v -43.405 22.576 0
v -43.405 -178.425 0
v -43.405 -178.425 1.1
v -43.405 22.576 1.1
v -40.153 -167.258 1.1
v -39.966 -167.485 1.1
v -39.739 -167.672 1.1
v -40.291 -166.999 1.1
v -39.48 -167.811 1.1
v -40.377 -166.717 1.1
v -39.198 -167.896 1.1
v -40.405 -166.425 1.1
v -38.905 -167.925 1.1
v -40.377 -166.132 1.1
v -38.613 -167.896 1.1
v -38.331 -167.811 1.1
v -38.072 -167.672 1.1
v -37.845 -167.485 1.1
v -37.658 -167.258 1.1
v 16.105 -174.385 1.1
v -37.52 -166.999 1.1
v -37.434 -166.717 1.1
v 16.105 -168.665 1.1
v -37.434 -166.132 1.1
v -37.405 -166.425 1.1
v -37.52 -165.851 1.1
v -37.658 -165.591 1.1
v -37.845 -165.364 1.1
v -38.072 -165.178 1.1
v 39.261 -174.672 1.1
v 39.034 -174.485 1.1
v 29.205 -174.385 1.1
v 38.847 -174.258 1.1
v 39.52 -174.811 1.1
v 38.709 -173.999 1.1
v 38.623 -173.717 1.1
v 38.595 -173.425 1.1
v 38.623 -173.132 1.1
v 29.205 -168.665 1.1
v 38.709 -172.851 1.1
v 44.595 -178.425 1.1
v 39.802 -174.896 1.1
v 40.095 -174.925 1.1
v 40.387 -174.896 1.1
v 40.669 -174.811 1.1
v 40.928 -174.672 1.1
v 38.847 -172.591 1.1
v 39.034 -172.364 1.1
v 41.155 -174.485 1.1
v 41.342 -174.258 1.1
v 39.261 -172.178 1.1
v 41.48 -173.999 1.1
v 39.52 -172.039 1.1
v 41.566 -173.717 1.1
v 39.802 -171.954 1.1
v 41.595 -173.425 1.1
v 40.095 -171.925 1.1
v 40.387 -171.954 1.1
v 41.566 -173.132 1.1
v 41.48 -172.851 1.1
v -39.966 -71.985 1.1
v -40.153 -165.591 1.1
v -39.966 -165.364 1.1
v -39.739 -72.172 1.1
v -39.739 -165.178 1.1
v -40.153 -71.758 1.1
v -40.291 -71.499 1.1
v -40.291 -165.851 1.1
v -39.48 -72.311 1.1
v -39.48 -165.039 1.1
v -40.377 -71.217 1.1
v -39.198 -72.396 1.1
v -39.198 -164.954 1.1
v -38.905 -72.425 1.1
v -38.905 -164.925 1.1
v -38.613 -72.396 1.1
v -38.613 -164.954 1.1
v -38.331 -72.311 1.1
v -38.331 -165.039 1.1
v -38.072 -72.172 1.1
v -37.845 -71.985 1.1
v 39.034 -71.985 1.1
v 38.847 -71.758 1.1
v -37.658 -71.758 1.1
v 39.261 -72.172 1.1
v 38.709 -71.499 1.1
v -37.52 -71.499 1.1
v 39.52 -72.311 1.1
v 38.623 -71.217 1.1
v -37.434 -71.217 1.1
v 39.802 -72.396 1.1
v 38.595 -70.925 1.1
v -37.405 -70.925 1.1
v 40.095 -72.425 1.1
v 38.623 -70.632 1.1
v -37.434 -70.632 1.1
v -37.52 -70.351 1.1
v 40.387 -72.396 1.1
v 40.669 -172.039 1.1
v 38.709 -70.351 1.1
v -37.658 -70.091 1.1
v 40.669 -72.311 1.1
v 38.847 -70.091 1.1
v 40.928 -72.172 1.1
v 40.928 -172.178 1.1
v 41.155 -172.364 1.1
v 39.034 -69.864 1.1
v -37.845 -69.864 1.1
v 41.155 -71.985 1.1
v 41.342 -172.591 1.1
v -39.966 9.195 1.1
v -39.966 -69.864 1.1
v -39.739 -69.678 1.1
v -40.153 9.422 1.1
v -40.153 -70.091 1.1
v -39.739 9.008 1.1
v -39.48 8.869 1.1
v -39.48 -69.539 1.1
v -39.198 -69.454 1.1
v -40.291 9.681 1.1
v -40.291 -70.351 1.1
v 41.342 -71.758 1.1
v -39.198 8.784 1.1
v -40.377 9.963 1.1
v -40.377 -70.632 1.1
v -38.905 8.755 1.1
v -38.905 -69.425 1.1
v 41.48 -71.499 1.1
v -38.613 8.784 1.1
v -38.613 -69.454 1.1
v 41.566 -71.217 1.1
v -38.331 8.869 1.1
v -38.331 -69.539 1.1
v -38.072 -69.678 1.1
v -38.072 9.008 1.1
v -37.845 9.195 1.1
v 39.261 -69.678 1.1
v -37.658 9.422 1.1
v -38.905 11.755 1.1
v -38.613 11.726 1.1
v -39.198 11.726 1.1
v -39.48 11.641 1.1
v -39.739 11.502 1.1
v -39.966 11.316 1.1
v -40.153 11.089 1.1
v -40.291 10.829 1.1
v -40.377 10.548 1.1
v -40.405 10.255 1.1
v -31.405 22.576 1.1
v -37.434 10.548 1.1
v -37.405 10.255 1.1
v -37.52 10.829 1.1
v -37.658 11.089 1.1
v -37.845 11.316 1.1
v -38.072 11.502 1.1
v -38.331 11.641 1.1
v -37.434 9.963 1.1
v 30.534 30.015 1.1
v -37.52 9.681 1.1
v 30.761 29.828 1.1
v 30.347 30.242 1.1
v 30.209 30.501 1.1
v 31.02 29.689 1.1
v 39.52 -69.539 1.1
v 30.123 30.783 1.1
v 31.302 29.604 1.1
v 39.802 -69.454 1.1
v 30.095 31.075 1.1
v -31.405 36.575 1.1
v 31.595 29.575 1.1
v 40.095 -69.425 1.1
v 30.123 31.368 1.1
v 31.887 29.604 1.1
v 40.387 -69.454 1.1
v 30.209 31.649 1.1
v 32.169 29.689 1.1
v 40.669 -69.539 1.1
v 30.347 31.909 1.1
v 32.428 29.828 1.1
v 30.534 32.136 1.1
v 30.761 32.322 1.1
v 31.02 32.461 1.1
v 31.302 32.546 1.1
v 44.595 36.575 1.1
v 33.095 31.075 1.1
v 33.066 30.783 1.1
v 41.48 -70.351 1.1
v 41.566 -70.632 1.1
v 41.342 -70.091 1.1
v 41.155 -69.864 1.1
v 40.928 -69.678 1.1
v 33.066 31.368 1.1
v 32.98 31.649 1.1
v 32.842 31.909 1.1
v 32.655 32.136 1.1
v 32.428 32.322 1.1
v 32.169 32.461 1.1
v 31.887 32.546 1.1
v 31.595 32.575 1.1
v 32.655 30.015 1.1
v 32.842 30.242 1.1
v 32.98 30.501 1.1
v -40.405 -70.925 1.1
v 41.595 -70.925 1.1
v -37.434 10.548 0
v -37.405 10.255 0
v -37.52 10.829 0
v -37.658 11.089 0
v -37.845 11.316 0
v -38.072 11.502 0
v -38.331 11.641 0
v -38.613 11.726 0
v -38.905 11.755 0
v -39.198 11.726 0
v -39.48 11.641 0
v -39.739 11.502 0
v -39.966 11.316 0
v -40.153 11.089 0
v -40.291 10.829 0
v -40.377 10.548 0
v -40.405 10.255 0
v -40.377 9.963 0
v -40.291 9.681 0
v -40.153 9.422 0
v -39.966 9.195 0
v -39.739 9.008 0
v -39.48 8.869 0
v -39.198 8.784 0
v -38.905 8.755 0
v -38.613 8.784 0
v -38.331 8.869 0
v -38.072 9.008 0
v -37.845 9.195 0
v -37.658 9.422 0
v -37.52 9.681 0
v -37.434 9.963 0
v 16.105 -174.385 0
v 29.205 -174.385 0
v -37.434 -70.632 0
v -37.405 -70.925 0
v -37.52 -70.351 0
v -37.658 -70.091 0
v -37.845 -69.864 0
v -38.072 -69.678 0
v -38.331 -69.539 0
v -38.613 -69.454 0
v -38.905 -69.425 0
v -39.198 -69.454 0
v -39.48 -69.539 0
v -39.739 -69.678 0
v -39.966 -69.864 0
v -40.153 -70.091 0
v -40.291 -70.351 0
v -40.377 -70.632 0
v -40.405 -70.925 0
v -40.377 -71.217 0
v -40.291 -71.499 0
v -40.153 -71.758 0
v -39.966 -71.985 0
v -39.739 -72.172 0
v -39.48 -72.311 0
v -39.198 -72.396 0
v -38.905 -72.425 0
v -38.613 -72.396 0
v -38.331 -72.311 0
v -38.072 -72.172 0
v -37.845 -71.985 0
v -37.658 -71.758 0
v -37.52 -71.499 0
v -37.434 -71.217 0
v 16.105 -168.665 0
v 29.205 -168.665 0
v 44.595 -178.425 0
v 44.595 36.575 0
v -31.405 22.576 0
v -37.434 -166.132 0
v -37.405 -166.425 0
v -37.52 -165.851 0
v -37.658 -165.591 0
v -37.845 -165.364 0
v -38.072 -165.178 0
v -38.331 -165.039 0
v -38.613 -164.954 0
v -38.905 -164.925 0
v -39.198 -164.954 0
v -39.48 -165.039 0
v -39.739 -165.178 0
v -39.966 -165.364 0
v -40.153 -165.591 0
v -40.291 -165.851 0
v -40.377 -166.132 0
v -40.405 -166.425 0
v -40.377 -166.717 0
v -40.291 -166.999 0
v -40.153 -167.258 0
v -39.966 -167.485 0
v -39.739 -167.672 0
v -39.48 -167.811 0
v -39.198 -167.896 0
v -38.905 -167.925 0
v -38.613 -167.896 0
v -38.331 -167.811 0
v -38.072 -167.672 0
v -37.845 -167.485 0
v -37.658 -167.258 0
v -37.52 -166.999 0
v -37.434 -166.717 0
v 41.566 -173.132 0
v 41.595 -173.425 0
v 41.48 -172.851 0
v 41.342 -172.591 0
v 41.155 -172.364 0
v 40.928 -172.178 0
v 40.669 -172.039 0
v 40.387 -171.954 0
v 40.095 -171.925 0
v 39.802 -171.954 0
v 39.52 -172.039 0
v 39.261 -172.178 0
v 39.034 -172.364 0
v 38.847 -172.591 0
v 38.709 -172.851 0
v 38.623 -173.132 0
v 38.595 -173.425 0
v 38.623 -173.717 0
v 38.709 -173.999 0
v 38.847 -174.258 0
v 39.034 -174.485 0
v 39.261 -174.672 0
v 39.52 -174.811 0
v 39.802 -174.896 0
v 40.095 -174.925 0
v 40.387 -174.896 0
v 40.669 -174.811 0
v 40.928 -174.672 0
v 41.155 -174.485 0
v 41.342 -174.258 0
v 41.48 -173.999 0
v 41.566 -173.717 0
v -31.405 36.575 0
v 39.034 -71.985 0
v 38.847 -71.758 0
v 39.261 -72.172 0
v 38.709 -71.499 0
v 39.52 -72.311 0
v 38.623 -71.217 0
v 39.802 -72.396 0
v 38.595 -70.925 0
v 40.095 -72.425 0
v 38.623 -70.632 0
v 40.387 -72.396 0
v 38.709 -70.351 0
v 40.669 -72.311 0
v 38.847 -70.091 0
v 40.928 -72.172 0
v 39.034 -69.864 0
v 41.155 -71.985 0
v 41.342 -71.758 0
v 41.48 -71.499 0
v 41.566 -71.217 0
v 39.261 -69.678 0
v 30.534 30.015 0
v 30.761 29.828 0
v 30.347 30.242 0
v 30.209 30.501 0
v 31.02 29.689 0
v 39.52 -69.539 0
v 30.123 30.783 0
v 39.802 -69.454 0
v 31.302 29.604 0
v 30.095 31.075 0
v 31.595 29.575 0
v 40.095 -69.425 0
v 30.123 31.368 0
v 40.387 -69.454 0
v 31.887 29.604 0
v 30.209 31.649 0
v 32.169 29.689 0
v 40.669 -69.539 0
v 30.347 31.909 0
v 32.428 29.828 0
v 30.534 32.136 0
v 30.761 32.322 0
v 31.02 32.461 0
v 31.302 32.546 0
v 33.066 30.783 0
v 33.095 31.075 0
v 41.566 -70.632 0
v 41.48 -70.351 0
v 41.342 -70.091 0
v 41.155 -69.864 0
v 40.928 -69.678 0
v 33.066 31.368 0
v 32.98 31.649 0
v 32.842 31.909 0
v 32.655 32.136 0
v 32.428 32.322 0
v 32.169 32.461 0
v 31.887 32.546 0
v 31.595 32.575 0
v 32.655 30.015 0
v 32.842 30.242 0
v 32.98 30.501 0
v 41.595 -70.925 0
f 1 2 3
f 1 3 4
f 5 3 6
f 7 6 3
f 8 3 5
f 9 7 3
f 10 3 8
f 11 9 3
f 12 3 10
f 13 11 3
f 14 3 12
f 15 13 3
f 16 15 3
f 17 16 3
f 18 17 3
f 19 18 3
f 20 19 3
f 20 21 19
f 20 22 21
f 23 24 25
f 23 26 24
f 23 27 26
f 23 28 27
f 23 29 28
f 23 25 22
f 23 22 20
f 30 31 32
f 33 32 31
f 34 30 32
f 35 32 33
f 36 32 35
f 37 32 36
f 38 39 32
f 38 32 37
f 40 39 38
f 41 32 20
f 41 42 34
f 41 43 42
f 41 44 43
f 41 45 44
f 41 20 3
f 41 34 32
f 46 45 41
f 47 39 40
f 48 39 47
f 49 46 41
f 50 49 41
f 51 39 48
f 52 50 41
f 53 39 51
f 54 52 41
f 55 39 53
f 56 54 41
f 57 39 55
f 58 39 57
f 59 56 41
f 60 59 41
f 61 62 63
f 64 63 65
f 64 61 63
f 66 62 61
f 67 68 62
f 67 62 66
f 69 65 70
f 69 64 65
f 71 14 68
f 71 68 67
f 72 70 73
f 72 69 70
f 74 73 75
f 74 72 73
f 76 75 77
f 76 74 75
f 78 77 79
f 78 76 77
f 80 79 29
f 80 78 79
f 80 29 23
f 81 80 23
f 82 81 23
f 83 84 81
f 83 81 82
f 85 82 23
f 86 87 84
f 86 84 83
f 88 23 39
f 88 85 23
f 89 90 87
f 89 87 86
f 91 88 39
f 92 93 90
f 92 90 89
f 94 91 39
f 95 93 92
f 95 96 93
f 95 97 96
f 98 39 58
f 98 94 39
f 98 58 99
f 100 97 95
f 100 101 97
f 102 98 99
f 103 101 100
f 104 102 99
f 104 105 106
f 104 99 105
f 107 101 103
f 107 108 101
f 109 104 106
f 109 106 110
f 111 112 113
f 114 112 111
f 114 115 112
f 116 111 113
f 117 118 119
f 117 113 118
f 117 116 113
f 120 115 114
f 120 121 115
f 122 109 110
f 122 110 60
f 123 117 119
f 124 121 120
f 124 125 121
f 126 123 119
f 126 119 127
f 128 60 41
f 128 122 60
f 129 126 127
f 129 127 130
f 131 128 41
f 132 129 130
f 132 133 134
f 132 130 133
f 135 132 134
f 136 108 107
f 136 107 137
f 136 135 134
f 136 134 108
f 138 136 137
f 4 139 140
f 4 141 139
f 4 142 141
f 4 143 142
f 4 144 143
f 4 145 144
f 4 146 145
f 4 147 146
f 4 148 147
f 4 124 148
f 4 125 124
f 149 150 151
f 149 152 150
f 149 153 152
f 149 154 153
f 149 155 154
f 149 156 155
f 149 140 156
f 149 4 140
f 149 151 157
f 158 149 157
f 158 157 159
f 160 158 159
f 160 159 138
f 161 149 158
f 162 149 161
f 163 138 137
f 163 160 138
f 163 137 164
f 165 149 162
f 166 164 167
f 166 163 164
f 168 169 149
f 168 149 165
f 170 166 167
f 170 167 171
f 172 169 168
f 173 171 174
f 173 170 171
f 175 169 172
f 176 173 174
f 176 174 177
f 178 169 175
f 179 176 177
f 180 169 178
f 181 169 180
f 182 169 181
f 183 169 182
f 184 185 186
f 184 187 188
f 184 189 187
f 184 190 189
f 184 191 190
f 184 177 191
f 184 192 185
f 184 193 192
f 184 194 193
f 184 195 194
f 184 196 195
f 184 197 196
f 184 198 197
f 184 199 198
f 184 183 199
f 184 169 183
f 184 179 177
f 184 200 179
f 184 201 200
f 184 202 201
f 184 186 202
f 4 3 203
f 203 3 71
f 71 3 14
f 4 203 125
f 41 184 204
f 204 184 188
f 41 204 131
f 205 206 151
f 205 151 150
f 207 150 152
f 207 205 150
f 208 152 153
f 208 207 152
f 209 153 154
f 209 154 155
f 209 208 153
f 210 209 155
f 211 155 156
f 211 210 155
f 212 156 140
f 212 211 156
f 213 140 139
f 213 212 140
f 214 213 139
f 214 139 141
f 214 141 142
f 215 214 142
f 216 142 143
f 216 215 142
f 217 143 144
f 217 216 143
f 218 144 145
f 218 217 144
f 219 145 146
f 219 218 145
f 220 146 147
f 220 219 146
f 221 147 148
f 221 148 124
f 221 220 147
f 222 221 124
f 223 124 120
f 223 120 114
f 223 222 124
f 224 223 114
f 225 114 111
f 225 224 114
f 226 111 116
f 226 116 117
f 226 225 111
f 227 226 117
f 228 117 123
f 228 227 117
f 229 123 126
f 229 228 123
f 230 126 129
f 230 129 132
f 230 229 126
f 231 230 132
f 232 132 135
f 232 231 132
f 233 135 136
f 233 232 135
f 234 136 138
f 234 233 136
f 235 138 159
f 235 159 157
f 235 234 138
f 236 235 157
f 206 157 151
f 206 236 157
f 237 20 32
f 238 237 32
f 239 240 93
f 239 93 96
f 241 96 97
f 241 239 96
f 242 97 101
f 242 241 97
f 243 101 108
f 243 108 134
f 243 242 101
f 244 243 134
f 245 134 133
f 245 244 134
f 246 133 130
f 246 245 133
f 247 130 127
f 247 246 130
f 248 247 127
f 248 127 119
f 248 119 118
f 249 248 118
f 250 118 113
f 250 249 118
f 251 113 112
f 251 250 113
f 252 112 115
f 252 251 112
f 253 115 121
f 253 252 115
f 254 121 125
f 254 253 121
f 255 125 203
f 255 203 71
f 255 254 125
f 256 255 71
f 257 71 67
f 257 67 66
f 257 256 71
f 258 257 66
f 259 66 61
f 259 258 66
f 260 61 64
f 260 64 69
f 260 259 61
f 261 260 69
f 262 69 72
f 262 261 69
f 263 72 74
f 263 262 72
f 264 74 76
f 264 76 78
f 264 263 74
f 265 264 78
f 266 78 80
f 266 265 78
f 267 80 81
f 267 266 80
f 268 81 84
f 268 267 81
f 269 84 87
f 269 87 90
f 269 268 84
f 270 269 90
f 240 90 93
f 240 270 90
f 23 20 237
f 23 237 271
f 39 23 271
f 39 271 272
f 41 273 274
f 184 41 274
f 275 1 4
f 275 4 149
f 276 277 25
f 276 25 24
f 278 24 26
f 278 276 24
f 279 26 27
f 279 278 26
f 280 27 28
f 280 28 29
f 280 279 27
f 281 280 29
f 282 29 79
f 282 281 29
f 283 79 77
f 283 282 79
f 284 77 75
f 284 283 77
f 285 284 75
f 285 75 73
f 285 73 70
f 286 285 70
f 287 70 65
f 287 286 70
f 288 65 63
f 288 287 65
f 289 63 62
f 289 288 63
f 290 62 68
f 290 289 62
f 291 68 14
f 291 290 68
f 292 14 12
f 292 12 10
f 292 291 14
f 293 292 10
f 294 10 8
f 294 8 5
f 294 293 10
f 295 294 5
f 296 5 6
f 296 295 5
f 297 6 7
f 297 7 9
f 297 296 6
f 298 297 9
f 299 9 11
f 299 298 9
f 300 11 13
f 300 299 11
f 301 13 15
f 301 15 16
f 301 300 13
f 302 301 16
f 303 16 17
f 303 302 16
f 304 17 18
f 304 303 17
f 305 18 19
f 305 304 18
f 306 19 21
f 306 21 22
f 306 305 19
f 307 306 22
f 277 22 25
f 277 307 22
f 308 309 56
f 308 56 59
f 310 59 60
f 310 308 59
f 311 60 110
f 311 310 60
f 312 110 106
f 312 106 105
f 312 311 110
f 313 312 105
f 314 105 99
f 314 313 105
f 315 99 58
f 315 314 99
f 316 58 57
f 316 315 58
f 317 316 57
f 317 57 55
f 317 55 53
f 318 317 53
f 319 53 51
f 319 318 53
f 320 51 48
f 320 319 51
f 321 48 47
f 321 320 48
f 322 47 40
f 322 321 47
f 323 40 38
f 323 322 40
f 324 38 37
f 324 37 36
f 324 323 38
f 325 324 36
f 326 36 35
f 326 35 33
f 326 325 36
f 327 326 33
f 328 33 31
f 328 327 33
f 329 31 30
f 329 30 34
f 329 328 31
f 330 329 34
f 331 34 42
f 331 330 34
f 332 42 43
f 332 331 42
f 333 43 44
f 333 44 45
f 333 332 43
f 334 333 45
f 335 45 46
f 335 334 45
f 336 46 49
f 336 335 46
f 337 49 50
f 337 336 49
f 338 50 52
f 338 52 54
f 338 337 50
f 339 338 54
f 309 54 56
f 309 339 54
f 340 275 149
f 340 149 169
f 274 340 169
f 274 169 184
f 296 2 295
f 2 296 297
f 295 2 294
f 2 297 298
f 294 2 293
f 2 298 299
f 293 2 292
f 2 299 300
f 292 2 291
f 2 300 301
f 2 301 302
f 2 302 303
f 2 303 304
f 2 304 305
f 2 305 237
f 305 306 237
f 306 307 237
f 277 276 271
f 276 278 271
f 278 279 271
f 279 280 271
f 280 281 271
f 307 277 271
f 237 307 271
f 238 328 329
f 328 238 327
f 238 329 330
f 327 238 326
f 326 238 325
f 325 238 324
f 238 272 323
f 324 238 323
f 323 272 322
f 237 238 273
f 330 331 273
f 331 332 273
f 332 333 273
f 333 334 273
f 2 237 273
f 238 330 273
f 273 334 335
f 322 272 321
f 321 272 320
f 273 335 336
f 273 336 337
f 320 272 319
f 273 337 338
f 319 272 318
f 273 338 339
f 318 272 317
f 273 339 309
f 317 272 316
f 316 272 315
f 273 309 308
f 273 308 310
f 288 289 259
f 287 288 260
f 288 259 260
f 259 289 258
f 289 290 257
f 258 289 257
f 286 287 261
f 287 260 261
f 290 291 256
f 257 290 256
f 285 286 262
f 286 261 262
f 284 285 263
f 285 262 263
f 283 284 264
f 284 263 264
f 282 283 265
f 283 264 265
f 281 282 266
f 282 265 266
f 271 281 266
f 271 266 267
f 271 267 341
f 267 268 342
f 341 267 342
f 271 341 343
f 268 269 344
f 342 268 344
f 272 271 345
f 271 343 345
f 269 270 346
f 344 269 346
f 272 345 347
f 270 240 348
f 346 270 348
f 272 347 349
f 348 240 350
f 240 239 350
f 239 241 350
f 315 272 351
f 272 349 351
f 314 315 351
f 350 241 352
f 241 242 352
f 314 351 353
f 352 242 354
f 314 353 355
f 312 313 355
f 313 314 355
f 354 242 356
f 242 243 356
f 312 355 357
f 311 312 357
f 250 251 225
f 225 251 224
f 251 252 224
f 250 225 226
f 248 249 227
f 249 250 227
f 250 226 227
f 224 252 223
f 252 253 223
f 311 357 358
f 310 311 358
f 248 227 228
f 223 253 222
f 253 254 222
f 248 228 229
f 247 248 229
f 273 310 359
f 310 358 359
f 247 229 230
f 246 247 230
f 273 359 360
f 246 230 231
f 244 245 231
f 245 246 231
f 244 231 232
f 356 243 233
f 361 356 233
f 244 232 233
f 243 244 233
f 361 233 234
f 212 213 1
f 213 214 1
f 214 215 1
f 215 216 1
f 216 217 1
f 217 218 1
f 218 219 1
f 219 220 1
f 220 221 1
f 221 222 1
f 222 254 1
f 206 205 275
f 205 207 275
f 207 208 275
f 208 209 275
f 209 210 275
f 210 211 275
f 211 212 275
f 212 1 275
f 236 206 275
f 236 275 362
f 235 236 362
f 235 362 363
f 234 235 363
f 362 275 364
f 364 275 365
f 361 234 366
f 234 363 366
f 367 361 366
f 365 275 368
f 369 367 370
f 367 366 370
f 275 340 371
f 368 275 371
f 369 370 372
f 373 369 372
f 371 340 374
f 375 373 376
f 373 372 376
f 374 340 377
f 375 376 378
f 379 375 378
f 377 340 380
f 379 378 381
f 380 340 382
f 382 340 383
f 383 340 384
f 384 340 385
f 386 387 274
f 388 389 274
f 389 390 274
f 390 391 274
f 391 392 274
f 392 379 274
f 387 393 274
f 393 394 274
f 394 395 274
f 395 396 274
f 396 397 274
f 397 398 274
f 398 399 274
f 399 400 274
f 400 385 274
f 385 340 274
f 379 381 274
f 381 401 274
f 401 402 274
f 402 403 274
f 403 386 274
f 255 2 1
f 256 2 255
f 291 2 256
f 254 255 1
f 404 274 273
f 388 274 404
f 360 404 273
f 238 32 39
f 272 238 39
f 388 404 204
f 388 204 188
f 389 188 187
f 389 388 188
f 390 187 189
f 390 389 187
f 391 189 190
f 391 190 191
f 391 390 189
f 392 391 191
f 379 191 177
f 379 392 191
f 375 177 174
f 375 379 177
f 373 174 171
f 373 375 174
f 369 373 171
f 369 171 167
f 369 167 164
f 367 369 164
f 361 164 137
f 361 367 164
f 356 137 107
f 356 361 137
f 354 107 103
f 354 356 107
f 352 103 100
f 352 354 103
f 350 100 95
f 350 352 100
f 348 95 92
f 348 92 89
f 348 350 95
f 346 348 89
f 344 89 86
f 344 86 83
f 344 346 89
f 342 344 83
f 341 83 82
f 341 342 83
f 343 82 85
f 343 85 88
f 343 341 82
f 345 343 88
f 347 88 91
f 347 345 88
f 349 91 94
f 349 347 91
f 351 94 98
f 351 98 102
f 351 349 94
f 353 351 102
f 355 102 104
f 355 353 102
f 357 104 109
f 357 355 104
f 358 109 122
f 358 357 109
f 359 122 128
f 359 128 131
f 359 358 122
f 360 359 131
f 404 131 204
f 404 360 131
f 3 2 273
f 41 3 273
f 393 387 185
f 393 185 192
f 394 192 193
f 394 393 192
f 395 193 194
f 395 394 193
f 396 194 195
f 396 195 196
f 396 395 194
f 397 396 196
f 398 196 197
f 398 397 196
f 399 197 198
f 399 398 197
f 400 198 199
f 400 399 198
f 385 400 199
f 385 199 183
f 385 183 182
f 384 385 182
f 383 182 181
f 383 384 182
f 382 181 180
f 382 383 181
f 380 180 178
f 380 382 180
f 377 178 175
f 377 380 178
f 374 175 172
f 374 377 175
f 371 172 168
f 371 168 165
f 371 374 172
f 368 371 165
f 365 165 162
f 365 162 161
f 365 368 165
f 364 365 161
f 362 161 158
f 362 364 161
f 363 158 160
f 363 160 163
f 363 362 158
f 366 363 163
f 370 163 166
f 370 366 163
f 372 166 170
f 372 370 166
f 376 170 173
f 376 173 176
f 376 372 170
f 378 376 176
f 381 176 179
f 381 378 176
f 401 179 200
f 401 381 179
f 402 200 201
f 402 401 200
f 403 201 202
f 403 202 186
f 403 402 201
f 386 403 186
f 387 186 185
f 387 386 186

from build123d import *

# Parameters (mm, degrees)
SKETCH3_W              = 88
SKETCH3_H              = 215
BOSS_EXTRUDE3_DEPTH    = 1.1
CUT_EXTRUDE1_OUTLINE_W = 12
CUT_EXTRUDE1_OUTLINE_H = 13.99905087
CUT_EXTRUDE1_OUTLINE_R = 1.5
CUT_EXTRUDE1_DEPTH     = 1.1
SKETCH5_W              = 13.1
SKETCH5_H              = 5.72
CUT_EXTRUDE3_DEPTH     = 1.1


# Read off the part's stored shape, not the designer's step: Cut-Extrude1
with BuildPart() as part:
    # Sketch3 → Boss-Extrude3 (new body)
    with BuildSketch(Plane.XY):
        with Locations((0.594511969, -70.924817192)):
            Rectangle(SKETCH3_W, SKETCH3_H)
    extrude(amount=BOSS_EXTRUDE3_DEPTH)

    # Cut-Extrude1 outline → Cut-Extrude1 (cut)
    with BuildSketch(Plane.XY):
        with Locations((-37.405488031, 29.575657373)):
            Rectangle(CUT_EXTRUDE1_OUTLINE_W, CUT_EXTRUDE1_OUTLINE_H)
        with Locations((31.594511969, 31.075182808)):
            Circle(CUT_EXTRUDE1_OUTLINE_R)
        with Locations((-38.905488031, -166.424817192)):
            Circle(CUT_EXTRUDE1_OUTLINE_R)
        with Locations((-38.905488031, -70.924817192)):
            Circle(CUT_EXTRUDE1_OUTLINE_R)
        with Locations((-38.905488031, 10.255182808)):
            Circle(CUT_EXTRUDE1_OUTLINE_R)
        with Locations((40.094511969, -70.924817192)):
            Circle(CUT_EXTRUDE1_OUTLINE_R)
        with Locations((40.094511969, -173.424817192)):
            Circle(CUT_EXTRUDE1_OUTLINE_R)
    extrude(amount=CUT_EXTRUDE1_DEPTH, mode=Mode.SUBTRACT)

    # Sketch5 → Cut-Extrude3 (cut)
    with BuildSketch(Plane.XY.offset(1.1)):
        with Locations((22.654511969, -171.524817192)):
            Rectangle(SKETCH5_W, SKETCH5_H)
    extrude(amount=-CUT_EXTRUDE3_DEPTH, mode=Mode.SUBTRACT)


solid = part.part
